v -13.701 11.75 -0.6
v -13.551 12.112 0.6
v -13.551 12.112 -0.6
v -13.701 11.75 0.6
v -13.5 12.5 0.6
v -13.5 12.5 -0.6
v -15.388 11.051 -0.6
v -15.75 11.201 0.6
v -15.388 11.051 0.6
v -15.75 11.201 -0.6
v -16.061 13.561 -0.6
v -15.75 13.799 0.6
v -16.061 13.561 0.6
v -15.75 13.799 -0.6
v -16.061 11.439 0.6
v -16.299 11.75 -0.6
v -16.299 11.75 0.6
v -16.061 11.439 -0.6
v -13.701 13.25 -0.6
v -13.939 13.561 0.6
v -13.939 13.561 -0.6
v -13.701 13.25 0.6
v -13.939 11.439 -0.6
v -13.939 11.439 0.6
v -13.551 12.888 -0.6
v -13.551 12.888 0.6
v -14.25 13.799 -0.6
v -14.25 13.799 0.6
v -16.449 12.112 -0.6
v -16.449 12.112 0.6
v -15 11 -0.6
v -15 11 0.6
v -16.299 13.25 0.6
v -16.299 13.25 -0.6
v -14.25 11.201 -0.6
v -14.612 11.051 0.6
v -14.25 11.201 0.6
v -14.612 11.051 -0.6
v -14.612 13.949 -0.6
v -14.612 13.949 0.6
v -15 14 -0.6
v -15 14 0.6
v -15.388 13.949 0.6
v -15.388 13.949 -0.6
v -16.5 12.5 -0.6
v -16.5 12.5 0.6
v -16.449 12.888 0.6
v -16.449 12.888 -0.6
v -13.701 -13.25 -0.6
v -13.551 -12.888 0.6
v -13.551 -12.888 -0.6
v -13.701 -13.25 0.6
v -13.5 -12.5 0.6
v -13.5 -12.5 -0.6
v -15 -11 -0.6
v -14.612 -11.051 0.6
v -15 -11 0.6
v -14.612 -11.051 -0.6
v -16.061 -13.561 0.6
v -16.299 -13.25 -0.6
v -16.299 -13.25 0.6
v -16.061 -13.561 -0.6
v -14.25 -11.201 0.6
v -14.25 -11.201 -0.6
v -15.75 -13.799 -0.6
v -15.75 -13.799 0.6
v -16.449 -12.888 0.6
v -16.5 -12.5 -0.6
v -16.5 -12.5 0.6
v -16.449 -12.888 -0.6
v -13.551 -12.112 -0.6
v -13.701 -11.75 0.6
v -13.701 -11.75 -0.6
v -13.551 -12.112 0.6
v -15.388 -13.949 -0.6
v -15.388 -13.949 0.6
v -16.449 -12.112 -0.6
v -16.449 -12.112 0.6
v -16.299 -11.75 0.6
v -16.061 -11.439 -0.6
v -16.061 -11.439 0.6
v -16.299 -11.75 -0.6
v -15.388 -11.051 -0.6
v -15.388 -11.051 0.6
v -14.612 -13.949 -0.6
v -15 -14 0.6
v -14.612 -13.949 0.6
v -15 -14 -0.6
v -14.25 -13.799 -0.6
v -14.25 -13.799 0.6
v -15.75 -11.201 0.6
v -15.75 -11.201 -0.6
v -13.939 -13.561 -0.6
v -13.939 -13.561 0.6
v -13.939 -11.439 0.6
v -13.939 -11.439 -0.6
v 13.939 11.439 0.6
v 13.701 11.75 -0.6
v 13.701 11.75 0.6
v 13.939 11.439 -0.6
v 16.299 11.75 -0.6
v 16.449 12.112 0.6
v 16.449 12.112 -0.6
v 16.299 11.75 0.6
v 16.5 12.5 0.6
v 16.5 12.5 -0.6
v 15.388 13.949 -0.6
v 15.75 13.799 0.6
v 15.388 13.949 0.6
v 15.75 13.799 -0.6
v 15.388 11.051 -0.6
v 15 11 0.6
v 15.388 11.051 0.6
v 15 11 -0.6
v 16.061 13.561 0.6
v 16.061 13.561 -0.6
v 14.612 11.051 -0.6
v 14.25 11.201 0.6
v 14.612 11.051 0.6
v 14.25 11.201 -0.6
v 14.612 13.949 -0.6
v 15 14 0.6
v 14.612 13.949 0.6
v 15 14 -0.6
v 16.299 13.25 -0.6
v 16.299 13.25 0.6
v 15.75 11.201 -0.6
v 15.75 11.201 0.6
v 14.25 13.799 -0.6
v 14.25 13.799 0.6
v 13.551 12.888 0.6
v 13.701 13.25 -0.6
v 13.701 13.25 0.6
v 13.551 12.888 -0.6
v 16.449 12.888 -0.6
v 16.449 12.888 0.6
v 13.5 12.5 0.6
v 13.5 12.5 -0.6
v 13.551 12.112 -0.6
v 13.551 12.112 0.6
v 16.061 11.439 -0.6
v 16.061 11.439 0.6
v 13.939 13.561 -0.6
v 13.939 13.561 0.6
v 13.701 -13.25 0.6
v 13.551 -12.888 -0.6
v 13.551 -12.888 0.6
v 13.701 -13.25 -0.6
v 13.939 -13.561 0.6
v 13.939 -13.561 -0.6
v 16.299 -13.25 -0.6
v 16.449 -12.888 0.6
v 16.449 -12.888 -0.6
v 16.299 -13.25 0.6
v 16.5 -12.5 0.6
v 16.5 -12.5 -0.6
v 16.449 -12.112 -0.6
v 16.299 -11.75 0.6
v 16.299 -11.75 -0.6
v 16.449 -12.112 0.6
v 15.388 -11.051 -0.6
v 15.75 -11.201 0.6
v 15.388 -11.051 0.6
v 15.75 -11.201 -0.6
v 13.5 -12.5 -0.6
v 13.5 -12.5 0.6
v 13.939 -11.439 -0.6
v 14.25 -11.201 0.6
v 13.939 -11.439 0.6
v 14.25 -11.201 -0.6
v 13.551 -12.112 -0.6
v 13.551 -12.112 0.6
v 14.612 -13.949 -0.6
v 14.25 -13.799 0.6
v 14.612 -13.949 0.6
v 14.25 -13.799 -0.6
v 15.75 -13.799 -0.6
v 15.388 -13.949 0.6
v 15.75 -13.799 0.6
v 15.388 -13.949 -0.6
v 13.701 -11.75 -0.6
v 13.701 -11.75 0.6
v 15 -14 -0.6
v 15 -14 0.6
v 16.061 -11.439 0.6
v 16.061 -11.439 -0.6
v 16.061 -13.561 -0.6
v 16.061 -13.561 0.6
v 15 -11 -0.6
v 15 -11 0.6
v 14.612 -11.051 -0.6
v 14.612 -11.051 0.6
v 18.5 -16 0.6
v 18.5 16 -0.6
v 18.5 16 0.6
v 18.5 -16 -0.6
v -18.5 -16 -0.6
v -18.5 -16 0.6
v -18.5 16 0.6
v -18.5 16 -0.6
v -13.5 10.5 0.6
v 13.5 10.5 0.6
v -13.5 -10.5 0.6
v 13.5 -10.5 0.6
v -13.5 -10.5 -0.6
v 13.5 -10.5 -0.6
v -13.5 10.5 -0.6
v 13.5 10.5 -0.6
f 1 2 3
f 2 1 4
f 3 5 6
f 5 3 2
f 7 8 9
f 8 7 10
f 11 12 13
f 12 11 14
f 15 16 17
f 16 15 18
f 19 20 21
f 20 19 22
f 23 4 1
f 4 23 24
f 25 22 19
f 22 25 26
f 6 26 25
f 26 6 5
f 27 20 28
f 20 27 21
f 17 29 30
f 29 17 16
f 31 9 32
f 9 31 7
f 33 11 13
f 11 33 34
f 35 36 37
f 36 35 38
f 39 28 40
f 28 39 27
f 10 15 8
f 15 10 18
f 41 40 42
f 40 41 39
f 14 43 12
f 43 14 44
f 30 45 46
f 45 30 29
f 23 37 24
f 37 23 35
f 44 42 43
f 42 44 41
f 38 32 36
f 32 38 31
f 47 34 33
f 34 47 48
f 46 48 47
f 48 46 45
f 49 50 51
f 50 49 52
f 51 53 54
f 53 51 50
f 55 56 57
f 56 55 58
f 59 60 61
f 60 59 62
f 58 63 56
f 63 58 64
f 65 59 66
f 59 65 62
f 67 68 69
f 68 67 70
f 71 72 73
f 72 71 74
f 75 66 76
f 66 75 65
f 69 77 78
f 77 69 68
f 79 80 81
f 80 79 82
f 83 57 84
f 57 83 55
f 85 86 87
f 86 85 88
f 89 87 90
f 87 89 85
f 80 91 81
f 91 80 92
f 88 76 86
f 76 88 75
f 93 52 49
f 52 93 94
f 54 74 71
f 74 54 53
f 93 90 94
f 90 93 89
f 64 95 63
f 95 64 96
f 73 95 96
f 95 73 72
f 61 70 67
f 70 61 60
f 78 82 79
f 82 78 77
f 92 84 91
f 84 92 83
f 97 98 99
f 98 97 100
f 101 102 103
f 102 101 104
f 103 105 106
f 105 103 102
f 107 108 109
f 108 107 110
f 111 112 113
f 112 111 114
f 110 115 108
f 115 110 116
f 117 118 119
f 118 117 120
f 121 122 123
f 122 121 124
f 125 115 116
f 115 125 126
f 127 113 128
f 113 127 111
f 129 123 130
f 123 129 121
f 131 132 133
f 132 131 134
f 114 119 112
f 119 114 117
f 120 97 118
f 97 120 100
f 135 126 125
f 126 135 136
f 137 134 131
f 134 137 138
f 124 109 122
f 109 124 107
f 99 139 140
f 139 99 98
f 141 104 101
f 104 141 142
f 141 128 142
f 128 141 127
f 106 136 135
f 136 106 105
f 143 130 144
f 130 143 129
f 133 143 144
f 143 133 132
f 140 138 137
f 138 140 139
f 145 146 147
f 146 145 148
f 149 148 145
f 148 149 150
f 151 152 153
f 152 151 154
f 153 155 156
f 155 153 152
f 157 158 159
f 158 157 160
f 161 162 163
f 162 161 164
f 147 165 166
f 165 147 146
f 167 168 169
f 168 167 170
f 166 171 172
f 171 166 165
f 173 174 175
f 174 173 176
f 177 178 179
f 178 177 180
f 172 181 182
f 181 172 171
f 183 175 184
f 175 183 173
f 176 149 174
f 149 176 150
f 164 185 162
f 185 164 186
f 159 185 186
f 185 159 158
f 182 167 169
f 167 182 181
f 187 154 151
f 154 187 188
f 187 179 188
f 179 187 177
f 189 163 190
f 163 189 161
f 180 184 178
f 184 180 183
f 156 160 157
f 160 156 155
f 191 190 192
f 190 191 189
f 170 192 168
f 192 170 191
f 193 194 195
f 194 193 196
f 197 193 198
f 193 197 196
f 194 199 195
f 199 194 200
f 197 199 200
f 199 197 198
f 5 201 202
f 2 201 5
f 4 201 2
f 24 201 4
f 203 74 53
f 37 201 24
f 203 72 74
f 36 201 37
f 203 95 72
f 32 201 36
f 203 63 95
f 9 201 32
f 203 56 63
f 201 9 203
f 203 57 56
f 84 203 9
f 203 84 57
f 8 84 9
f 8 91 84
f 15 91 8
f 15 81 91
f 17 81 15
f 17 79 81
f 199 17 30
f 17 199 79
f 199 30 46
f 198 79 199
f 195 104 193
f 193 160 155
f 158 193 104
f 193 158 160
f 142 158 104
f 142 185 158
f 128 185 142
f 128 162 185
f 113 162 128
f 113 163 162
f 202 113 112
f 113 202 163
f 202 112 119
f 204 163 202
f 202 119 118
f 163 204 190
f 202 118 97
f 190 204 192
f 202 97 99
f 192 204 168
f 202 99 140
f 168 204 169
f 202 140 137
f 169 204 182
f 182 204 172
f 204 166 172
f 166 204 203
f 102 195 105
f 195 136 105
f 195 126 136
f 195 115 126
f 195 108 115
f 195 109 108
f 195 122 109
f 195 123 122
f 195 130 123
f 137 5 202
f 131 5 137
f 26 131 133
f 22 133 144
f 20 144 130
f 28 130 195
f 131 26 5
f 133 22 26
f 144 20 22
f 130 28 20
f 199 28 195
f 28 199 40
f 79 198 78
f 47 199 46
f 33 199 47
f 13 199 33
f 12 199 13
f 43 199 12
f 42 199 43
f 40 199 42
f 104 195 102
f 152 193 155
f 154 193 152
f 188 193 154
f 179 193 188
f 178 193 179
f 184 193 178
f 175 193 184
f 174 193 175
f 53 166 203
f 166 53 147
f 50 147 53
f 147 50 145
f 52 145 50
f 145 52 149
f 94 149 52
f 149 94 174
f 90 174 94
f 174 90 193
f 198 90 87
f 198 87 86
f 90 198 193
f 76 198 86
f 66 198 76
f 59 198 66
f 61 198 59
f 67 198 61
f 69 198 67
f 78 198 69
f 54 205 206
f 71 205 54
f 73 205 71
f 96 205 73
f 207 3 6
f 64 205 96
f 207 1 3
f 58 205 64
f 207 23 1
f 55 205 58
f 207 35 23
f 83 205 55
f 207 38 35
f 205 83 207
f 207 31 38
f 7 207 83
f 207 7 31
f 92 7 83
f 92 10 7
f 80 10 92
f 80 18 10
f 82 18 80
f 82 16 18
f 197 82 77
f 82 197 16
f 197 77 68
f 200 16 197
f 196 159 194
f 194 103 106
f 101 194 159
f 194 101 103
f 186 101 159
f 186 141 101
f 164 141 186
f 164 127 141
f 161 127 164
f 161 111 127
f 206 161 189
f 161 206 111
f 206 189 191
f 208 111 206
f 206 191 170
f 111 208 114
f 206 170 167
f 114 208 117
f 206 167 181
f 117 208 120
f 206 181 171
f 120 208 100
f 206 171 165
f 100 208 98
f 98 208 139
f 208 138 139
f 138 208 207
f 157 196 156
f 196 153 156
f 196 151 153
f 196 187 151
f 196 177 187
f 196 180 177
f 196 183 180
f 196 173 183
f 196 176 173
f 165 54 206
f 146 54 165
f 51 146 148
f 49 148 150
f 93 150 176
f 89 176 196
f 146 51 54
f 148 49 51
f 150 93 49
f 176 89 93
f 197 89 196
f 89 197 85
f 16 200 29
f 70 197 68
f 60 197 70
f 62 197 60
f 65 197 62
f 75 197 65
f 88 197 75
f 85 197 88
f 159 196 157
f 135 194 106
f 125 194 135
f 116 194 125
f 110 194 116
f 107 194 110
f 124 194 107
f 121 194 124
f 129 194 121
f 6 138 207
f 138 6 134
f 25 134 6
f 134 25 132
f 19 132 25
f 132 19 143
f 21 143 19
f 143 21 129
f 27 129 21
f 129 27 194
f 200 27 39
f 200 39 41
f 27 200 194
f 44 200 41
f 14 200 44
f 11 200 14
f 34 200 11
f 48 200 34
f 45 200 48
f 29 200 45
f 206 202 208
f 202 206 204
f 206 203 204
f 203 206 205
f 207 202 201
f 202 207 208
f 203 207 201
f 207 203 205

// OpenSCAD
// box dimensions
w = 76.2;
l = 90;
d = 40;
thick = 3;
fillet = 3;
$fa = 1;
$fs = 0.4;

// points
module bolts_MAX(diameter, thickness) {
    points = [[-30/2,-25/2,0], [-30/2,25/2,0], [30/2,-25/2,0], [30/2,25/2,0]];
    for (p = points){
        rotate([90,0,0]) translate(p) cylinder(d=diameter, h=thickness, center=true);
    }
}

rotate([90,0,0])
difference() {
    // base
    cube([37, 1.2, 32], center = true);
    // window for MAX31865 chip components
    cube([27, thick, 21], center = true);

    // holes for MAX31865 chip bolts
    bolts_MAX(diameter = 3, thickness = thick);
}
